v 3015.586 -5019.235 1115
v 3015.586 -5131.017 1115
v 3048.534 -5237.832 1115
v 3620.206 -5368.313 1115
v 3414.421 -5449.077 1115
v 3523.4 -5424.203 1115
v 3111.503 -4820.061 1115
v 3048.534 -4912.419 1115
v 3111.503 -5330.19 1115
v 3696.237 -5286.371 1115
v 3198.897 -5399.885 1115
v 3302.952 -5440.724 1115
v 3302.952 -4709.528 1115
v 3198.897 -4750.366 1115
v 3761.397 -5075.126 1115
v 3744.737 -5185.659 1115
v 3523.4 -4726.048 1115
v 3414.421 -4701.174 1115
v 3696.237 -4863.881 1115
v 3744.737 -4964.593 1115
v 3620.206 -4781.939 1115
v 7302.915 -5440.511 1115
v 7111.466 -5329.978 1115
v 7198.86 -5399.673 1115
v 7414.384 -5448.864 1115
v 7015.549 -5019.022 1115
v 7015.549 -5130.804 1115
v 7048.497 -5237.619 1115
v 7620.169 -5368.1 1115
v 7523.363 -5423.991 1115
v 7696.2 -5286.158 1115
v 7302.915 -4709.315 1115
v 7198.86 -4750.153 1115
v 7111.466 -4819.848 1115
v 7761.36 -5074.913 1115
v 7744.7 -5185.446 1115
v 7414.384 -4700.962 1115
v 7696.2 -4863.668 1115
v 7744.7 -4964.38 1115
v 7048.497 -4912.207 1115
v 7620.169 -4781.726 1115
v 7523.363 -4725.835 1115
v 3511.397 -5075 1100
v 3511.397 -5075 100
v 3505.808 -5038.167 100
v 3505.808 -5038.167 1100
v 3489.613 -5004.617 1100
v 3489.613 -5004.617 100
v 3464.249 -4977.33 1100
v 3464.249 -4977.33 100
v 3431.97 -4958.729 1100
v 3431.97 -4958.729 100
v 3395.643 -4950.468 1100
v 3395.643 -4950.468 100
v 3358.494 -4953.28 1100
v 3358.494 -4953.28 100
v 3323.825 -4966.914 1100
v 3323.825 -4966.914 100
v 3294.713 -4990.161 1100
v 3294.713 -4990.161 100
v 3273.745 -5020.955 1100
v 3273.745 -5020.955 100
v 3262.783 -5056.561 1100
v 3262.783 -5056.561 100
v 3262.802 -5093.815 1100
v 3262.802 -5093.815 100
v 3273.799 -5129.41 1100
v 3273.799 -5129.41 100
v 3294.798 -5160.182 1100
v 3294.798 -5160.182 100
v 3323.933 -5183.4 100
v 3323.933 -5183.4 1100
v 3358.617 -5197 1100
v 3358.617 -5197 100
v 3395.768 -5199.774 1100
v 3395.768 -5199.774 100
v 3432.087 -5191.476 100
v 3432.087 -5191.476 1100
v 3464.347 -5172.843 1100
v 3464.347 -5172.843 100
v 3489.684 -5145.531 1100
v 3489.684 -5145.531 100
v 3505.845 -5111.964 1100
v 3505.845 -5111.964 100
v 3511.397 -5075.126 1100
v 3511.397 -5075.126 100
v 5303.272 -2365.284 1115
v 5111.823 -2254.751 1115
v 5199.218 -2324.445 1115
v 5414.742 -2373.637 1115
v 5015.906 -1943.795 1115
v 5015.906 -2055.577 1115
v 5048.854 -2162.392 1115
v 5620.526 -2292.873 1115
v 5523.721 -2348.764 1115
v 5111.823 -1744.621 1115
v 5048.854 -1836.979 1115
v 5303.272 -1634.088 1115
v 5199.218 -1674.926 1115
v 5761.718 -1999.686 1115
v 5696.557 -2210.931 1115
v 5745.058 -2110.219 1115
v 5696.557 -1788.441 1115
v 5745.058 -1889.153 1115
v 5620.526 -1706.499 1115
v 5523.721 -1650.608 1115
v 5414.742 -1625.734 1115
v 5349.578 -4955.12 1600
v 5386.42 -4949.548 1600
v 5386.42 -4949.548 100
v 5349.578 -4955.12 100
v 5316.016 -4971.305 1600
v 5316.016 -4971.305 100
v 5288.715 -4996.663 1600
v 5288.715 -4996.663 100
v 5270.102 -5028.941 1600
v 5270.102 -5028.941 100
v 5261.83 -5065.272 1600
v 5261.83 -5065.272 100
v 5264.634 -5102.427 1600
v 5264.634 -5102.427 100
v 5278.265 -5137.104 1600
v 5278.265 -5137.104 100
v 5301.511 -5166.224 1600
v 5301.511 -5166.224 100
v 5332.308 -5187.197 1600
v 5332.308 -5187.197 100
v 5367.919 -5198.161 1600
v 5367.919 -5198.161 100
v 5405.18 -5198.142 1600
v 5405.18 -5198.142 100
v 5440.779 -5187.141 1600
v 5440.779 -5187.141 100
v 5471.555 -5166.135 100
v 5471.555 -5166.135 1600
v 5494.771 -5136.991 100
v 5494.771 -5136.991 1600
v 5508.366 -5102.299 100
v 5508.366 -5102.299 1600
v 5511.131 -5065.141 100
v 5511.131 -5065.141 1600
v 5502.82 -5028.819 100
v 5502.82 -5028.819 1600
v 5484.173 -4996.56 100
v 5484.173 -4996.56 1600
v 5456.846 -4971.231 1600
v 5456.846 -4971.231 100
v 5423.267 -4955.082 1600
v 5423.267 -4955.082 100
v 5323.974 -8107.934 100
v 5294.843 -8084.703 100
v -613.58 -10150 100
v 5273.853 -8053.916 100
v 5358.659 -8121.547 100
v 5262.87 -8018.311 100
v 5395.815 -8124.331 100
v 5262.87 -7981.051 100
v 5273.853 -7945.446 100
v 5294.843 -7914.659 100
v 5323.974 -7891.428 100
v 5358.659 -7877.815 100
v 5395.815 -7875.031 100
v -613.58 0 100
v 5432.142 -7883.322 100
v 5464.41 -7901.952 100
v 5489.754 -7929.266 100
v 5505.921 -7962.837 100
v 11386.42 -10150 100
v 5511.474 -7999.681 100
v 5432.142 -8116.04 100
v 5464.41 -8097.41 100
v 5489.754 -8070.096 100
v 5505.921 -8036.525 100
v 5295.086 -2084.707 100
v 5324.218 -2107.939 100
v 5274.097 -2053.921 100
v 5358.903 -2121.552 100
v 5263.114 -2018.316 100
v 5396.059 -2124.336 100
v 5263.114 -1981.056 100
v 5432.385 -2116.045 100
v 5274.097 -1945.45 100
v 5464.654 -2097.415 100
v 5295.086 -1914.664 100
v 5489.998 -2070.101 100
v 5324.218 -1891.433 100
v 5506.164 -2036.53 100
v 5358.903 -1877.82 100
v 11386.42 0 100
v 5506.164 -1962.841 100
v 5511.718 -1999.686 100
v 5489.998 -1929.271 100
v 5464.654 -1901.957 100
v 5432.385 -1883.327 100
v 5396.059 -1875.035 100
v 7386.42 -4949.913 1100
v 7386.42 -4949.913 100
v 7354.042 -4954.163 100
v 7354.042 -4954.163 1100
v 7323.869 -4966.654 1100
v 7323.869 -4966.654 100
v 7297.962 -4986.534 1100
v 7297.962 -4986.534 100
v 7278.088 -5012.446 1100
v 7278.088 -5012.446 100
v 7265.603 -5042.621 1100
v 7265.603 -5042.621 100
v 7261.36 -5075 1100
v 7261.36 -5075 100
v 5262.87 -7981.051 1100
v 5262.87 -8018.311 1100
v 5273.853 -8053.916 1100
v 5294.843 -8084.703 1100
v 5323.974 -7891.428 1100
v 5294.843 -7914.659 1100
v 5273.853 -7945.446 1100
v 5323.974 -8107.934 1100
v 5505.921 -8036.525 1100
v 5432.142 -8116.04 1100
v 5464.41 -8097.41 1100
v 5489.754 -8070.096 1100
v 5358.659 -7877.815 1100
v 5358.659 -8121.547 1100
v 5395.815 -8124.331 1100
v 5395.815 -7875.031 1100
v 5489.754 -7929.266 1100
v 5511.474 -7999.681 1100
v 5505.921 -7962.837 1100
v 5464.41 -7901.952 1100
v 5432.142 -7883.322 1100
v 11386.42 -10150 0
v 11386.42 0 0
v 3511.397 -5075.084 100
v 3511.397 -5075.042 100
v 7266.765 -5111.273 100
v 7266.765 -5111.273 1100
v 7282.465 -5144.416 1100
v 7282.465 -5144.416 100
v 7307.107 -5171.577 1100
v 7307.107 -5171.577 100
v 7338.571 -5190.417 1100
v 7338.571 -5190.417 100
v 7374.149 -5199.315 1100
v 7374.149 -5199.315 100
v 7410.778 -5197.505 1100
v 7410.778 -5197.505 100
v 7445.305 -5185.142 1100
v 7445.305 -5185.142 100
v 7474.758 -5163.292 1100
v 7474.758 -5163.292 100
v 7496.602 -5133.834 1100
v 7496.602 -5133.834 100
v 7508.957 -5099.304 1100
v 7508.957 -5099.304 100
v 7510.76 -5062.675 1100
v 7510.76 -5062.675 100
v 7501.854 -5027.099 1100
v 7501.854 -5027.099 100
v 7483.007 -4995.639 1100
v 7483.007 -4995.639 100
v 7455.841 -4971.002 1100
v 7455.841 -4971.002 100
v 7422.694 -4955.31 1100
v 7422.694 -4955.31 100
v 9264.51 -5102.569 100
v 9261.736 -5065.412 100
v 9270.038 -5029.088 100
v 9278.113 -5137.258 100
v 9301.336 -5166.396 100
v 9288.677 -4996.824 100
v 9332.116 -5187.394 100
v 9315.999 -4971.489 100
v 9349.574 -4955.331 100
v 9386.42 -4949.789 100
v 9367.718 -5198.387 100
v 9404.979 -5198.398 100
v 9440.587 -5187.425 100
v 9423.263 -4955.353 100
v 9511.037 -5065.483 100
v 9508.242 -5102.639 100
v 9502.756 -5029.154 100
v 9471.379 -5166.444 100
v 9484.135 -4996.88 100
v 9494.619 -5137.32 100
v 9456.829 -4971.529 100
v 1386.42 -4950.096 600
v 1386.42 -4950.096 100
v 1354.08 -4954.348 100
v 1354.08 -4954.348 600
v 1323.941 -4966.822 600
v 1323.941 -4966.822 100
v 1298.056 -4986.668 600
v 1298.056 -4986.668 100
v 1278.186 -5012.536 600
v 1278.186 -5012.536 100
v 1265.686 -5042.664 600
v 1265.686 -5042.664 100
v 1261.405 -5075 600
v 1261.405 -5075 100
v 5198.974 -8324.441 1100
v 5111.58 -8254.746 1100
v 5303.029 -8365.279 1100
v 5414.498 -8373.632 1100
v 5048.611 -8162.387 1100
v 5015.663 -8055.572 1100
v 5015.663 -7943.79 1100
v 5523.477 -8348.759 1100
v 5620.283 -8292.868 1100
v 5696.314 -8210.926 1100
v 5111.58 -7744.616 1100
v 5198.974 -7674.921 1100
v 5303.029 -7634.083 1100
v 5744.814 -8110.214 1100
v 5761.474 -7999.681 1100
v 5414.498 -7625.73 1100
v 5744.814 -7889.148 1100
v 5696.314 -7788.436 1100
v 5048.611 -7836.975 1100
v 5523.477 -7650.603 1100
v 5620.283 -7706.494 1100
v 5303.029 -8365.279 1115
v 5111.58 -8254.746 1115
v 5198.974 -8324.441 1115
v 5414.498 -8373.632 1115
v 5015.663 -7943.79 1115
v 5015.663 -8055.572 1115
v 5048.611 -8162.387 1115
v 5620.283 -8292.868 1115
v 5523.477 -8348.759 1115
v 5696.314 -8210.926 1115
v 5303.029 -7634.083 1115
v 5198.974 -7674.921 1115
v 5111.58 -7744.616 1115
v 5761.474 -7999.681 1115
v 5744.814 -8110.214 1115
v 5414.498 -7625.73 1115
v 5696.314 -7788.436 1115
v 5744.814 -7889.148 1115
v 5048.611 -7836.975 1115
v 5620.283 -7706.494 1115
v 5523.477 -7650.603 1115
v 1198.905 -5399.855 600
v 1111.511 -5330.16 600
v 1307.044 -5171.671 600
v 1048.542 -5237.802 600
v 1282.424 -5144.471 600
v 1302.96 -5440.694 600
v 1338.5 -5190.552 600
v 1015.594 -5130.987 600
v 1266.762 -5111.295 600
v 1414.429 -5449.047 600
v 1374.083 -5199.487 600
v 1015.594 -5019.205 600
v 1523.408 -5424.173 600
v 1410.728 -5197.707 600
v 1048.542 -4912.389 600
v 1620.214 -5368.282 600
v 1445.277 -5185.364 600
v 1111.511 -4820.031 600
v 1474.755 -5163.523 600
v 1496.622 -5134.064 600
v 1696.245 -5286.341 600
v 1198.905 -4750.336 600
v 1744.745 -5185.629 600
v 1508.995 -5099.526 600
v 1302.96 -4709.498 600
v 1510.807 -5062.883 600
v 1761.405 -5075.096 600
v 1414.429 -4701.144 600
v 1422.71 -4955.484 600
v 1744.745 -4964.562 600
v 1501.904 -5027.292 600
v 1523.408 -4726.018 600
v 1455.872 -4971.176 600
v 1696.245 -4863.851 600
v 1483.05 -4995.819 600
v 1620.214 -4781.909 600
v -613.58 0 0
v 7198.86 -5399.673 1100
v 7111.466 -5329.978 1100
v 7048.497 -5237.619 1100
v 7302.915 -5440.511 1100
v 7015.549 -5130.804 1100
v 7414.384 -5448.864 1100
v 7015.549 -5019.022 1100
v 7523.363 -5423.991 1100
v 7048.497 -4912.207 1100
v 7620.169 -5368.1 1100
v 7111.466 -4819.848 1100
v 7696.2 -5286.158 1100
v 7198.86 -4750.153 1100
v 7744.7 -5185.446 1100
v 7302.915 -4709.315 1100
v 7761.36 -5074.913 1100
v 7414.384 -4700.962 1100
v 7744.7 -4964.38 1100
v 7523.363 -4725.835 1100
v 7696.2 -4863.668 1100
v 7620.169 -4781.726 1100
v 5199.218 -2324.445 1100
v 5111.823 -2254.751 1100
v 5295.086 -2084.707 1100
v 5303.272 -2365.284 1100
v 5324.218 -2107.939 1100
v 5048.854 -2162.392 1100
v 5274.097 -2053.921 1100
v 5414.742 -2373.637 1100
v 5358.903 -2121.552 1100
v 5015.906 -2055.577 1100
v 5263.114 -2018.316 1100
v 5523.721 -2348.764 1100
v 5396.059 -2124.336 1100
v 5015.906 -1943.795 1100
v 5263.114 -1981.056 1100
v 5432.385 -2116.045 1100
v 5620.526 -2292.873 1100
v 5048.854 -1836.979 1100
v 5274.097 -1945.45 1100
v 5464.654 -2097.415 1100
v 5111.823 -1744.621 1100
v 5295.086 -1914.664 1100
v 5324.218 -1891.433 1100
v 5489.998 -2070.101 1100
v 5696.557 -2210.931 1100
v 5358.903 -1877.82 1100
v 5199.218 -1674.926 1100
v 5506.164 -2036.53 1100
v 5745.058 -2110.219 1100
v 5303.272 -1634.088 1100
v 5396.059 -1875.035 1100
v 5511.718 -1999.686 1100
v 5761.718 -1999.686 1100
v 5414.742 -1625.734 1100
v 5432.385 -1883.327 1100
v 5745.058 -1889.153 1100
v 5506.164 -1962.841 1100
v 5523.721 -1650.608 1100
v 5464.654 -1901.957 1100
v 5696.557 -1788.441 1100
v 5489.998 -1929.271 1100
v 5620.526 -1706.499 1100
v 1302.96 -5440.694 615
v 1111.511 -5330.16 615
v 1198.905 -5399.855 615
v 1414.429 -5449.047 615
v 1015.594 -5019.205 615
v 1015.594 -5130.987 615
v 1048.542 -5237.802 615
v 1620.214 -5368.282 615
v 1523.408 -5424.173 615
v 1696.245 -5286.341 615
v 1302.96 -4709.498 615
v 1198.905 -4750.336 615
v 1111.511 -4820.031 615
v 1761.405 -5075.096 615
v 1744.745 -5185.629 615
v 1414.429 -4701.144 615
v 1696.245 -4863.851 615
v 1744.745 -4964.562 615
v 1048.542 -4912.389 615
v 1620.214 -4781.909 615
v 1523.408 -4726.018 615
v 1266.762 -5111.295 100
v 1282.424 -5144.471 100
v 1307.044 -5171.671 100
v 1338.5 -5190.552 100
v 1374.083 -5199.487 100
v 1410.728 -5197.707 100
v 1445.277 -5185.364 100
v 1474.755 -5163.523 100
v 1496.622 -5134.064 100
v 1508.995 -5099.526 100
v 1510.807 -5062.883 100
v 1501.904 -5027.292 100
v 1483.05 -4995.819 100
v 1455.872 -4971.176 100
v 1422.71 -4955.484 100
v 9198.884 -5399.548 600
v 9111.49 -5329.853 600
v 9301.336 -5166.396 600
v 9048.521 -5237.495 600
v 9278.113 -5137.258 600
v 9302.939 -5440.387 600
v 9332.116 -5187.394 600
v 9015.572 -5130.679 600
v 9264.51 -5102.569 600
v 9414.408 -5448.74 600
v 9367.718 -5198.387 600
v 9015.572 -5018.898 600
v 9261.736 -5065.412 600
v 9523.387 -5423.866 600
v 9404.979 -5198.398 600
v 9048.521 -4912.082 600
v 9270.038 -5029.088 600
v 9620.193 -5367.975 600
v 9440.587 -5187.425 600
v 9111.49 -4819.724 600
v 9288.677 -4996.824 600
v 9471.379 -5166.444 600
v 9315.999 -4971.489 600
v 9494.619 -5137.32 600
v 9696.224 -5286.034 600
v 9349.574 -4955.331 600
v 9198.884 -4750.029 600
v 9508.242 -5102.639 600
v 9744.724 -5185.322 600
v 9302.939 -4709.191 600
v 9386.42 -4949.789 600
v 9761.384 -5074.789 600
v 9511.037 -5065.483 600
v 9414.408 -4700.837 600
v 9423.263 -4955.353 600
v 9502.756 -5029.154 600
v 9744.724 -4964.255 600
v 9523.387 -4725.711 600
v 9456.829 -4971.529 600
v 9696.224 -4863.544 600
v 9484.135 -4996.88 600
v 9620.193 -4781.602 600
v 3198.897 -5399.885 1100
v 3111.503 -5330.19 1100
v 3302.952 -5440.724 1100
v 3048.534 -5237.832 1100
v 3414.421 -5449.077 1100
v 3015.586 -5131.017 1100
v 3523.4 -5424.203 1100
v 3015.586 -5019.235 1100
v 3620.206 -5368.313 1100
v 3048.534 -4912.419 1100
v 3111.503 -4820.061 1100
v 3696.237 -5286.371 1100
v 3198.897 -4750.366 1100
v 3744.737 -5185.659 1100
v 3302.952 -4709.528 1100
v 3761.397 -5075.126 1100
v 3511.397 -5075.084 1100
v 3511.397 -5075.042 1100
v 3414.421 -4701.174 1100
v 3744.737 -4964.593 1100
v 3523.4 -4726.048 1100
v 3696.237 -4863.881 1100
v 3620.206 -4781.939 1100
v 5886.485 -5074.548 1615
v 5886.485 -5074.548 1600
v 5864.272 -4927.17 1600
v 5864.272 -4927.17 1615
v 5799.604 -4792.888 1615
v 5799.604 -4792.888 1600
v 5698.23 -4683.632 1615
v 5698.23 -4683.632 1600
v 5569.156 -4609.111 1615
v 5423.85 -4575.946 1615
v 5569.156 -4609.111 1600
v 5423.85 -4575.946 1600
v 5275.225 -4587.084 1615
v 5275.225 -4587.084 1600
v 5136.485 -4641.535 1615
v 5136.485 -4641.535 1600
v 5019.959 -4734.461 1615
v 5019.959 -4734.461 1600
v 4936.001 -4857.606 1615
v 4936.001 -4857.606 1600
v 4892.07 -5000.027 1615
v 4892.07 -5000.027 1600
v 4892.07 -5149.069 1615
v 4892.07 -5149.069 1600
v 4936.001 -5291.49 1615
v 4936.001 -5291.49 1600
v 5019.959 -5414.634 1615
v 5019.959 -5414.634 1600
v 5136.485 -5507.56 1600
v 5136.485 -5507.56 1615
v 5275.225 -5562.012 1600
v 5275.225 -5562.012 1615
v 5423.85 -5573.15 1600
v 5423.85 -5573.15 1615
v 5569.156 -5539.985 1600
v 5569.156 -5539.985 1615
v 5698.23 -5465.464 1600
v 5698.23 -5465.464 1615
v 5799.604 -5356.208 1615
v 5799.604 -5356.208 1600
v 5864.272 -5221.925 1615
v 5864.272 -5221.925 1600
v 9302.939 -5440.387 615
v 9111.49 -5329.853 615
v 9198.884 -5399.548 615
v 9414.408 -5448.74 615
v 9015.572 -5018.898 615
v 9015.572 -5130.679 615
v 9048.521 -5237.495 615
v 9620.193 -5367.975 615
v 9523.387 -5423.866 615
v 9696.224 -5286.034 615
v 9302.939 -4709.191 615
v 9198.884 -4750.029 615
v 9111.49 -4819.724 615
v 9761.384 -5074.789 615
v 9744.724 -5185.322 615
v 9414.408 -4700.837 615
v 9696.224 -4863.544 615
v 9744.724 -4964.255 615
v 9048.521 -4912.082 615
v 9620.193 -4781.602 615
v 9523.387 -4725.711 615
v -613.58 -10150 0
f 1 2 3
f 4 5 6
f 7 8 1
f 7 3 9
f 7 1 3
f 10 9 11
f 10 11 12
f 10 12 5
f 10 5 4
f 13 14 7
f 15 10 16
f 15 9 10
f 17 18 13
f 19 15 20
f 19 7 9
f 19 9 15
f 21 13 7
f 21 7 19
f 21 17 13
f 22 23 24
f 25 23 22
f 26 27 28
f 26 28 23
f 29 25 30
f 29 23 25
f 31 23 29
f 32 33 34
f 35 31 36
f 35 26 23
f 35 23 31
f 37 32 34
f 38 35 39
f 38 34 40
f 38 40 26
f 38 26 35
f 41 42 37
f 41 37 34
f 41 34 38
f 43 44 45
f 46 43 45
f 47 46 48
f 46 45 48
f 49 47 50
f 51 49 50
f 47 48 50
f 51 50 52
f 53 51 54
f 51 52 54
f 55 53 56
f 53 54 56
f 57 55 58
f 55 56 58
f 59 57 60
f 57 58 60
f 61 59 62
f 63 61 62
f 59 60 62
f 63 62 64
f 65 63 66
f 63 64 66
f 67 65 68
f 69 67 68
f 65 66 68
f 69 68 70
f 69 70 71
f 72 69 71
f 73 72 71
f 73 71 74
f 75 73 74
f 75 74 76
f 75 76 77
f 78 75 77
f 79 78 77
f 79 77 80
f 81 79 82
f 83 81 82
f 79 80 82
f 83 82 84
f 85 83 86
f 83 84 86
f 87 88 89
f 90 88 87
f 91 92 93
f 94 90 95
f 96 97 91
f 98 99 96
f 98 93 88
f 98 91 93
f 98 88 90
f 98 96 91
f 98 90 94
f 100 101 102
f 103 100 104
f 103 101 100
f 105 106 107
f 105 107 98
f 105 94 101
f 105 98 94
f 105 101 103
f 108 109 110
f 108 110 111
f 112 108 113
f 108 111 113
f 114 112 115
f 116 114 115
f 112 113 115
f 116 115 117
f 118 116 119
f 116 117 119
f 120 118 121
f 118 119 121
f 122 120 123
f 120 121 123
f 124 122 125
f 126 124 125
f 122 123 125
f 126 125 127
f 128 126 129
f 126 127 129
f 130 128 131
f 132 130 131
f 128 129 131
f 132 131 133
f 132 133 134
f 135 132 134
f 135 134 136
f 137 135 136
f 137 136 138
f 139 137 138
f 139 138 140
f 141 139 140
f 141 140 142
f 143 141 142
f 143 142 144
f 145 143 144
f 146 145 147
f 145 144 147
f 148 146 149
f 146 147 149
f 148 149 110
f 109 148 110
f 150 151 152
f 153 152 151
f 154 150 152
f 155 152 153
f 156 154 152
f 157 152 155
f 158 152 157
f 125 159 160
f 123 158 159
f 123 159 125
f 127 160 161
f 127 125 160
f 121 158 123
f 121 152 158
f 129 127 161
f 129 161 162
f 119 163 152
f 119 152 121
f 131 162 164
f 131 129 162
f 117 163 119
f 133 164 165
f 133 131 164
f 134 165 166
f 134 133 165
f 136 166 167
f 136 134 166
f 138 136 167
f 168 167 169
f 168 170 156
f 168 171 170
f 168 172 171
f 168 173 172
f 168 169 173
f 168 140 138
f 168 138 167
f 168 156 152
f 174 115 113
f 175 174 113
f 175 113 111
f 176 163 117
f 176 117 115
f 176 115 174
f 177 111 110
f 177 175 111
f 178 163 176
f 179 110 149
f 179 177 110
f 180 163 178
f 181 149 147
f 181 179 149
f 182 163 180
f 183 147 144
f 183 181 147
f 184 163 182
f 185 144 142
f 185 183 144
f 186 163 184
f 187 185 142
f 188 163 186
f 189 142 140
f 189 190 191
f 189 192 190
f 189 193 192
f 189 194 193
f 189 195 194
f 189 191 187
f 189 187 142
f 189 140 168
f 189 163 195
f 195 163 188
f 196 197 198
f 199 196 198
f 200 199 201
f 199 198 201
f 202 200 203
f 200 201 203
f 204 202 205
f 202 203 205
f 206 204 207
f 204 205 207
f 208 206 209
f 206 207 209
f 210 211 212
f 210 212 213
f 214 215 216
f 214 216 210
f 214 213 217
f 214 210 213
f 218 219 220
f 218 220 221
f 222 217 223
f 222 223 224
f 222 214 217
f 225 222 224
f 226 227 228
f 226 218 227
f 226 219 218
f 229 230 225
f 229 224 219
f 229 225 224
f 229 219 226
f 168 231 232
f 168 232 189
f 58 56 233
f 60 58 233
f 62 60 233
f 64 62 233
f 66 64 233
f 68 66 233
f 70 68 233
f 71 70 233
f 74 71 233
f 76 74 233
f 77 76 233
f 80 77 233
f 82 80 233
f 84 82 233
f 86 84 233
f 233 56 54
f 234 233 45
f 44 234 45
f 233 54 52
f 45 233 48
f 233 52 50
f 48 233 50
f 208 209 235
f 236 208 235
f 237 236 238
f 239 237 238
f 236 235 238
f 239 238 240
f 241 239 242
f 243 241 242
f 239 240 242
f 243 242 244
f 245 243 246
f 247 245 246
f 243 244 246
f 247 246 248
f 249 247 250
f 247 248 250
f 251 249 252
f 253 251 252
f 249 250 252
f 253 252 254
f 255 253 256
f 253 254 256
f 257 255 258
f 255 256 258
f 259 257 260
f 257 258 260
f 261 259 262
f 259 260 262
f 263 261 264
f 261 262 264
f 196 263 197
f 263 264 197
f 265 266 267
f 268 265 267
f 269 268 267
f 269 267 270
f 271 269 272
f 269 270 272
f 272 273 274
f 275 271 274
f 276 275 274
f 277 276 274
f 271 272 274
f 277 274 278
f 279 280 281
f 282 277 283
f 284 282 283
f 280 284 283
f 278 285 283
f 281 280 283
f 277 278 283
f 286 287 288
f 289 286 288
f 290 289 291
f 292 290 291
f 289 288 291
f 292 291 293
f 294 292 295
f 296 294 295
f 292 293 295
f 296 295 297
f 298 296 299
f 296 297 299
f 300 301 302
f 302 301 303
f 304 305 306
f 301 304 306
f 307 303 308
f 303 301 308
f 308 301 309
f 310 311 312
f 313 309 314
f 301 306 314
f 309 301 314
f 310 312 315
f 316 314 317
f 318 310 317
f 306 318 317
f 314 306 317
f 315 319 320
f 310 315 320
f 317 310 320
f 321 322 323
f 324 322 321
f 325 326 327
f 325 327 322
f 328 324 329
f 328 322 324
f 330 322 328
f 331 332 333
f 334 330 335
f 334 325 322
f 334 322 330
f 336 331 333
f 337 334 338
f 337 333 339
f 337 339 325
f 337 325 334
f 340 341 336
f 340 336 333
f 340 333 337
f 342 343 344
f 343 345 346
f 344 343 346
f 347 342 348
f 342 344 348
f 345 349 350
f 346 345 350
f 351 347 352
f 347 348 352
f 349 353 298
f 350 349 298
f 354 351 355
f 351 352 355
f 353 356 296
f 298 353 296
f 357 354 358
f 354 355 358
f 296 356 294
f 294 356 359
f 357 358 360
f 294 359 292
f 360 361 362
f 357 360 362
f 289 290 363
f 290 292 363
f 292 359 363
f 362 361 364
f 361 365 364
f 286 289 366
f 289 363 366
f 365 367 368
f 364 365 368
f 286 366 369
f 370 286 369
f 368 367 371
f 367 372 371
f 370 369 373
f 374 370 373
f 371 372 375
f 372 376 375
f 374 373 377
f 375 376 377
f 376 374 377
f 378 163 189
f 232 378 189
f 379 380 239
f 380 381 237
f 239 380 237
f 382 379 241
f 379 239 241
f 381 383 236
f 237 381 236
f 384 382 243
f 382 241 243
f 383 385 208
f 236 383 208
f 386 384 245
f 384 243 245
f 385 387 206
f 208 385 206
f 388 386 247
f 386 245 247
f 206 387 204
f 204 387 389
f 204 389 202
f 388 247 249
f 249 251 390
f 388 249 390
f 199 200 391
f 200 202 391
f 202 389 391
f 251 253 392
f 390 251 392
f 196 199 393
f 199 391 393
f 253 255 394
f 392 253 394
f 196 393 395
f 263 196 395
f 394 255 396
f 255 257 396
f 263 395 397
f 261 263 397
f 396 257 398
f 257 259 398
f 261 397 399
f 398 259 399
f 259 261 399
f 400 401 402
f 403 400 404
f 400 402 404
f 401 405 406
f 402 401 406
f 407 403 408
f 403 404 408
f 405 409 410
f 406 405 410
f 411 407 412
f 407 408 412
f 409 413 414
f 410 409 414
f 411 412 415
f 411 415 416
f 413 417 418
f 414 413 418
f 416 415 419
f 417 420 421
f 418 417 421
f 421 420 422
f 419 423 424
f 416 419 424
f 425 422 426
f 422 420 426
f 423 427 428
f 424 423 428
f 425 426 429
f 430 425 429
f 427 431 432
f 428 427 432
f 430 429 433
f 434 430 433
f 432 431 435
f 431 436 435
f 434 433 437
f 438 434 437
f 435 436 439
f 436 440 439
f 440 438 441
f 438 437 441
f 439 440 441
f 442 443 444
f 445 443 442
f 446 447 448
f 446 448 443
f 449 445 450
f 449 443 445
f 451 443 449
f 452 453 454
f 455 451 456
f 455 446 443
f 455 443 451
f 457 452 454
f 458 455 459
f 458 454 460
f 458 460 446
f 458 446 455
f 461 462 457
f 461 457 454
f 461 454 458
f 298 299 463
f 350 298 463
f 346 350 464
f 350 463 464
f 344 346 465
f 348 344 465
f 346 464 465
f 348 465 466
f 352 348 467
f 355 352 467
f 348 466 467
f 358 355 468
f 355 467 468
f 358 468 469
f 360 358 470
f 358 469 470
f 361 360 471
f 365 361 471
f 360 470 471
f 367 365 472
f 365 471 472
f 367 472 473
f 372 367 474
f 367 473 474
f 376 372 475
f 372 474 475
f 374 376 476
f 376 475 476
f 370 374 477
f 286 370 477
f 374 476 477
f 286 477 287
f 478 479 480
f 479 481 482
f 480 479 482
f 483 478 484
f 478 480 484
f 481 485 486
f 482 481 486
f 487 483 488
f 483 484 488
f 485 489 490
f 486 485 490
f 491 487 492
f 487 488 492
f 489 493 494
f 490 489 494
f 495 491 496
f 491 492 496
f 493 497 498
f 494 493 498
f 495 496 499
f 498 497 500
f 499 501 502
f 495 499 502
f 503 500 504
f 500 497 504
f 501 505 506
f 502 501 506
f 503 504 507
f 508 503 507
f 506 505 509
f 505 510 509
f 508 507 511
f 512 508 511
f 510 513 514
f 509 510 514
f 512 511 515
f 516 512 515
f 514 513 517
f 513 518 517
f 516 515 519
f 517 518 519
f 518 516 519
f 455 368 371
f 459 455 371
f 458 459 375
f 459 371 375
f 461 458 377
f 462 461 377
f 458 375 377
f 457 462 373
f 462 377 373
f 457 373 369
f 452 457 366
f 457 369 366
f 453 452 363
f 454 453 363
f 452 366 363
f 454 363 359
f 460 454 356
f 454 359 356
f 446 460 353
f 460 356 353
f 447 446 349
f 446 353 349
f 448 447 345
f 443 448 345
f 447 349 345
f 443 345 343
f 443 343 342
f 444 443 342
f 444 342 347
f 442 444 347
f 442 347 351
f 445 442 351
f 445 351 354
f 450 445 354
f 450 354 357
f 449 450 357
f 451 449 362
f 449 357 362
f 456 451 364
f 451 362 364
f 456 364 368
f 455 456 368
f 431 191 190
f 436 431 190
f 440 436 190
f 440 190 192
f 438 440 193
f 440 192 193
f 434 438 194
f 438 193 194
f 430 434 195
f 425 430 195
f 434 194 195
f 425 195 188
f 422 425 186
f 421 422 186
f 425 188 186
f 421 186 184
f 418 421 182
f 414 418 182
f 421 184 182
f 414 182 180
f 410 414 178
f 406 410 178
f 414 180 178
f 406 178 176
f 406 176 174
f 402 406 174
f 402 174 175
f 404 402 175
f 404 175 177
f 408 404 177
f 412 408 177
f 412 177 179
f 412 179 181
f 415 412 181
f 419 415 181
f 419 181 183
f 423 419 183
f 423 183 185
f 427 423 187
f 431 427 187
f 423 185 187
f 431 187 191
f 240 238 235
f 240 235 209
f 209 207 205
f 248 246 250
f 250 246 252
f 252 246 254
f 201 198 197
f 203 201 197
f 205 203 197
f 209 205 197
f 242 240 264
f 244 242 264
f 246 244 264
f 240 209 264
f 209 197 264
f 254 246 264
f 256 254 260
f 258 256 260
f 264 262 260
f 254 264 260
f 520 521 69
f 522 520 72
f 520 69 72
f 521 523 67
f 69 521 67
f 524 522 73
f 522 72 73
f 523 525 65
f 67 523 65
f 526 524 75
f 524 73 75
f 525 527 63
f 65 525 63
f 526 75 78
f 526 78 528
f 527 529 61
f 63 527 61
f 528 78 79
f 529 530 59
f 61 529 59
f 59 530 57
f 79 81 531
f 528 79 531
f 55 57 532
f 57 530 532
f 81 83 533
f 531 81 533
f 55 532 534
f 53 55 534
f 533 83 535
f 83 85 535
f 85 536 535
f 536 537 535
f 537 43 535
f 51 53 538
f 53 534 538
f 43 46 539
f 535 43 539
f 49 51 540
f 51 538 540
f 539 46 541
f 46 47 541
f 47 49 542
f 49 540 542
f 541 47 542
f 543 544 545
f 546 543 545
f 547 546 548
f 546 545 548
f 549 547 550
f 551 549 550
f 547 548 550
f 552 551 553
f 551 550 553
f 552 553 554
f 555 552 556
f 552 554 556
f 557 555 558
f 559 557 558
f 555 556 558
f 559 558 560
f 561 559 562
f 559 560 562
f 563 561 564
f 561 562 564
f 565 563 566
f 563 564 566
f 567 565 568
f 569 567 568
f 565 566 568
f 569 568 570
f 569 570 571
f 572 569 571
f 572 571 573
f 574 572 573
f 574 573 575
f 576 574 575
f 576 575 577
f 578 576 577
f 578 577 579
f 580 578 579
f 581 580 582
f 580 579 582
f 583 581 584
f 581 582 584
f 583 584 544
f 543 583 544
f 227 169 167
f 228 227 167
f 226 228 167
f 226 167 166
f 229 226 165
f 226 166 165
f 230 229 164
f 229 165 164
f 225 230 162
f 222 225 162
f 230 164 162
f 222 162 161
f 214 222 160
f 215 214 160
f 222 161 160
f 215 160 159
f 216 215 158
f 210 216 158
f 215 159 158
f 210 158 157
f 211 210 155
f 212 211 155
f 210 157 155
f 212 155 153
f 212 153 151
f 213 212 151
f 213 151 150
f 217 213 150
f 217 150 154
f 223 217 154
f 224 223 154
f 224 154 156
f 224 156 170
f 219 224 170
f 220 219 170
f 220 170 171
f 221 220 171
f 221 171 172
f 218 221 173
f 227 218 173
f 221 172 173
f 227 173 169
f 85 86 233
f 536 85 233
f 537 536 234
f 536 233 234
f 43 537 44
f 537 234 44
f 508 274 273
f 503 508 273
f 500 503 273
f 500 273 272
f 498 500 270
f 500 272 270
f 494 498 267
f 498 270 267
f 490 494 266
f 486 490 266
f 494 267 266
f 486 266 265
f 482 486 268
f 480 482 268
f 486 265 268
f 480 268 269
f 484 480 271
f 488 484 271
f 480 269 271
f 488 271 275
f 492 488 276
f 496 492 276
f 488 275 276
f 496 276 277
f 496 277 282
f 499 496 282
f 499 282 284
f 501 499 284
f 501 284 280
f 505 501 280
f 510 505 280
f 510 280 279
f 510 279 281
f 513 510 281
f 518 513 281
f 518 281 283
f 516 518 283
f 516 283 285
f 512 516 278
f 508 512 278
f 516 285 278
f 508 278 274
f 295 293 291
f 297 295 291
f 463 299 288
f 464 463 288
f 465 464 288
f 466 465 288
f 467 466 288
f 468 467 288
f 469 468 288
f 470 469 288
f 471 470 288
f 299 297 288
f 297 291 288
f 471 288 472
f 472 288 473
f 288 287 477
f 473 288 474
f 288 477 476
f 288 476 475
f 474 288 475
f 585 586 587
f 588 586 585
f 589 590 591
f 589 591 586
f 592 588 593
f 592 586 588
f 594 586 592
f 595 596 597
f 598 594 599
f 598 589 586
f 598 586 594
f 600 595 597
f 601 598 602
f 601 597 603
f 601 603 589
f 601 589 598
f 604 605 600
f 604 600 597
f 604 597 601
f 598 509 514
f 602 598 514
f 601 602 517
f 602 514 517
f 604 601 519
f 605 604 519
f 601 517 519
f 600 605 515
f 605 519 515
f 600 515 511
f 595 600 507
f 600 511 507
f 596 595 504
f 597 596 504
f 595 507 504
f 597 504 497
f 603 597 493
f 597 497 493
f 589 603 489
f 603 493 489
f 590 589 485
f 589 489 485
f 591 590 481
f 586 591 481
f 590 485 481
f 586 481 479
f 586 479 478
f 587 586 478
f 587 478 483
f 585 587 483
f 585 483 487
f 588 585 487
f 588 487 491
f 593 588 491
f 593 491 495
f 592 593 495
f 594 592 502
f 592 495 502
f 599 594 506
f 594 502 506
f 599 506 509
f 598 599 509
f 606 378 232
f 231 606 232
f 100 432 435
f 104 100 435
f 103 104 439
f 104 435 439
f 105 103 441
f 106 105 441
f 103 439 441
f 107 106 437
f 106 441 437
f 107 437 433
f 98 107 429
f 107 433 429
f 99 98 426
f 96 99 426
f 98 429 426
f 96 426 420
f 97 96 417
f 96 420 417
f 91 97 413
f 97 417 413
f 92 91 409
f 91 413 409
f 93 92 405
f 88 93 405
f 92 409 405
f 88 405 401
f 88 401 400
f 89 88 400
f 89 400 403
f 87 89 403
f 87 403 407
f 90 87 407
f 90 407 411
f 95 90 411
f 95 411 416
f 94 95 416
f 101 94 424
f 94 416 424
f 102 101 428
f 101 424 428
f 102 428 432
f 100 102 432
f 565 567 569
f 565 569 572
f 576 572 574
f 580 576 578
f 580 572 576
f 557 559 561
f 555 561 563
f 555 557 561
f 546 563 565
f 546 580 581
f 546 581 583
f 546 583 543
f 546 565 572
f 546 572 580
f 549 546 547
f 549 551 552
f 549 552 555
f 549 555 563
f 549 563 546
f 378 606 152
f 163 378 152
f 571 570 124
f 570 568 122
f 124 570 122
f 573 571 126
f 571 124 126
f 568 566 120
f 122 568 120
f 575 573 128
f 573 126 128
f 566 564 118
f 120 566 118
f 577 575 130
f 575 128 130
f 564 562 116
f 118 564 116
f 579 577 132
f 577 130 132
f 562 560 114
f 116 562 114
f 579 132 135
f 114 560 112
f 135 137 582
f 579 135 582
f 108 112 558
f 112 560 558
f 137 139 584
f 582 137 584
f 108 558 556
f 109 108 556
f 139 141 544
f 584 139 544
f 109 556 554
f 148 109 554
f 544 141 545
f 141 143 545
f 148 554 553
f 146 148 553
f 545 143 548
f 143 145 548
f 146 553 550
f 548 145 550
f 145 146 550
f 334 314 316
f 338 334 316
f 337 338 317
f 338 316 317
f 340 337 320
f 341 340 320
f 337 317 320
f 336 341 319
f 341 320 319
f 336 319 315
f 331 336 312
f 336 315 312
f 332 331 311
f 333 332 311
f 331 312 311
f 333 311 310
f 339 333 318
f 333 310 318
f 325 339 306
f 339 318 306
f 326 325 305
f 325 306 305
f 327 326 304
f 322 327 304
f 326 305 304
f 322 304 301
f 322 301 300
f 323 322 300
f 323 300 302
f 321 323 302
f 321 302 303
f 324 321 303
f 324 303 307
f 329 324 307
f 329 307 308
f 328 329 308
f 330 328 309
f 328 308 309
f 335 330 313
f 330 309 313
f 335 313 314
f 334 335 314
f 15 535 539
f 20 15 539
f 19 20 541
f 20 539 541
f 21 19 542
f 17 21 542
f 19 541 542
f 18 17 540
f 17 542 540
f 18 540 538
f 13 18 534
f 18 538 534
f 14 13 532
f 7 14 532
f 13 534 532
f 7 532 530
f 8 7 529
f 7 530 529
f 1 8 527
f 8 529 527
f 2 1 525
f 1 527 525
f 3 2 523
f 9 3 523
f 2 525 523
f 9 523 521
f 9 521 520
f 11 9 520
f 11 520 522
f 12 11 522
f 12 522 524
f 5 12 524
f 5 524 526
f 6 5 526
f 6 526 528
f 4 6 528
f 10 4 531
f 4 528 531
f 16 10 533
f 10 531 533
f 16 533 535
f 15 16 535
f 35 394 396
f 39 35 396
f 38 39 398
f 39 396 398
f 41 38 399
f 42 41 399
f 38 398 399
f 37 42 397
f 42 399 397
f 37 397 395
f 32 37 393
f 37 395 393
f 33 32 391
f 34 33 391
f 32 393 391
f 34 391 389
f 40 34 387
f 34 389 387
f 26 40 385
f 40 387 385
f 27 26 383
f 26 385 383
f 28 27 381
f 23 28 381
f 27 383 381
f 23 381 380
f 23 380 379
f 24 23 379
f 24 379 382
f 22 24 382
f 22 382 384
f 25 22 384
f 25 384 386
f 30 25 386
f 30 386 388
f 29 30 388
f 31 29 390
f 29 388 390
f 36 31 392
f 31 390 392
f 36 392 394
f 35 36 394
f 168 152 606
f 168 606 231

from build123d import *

# Parameters (mm, degrees)
F0_W      = 12000
F0_H      = 100
F1_DEPTH  = 10150
F10_DEPTH = 1500
F11_DEPTH = 500
F12_DEPTH = 1000
F16_DEPTH = 1000
F17_R     = 375
F17_R_2   = 125
F18_DEPTH = 15
F19_R     = 500
F19_R_2   = 125
F20_DEPTH = 15
F21_R     = 375
F21_R_2   = 125
F22_DEPTH = 15
F23_R     = 375
F23_R_2   = 125
F24_DEPTH = 15
F25_R     = 375
F26_DEPTH = 15
F27_R     = 375
F27_R_2   = 125
F28_DEPTH = 15
F29_R     = 375
F29_R_2   = 125
F30_DEPTH = 15


with BuildPart() as f1:
    # F0 (on Front) → F1 (new body)
    with BuildSketch(Plane.XZ):
        with Locations((5386.4197711137, 50)):
            Rectangle(F0_W, F0_H)
    extrude(amount=F1_DEPTH)

    # F3 (on face) → F10 (join)
    with BuildSketch(Plane.XY.offset(100)):
        with BuildLine():
            ThreePointArc((5261.4859178516, -5075), (5386.7112163429, -5199.5475631242), (5511.4850997925, -5074.5477676392))
            ThreePointArc((5511.4850997925, -5074.5477676392), (5474.8503472463, -4986.136325832), (5386.4197711137, -4949.5477847105))
            Line((5386.4197711137, -4949.5477847105), (5386.4197711137, -5075))
            Line((5386.4197711137, -5075), (5261.4859178516, -5075))
        make_face()
        with BuildLine():
            Line((5386.4197711137, -5075), (5386.4197711137, -4949.5477847105))
            ThreePointArc((5386.4197711137, -4949.5477847105), (5297.9139558776, -4986.3425950833), (5261.4859178516, -5075))
            Line((5261.4859178516, -5075), (5386.4197711137, -5075))
        make_face()
    extrude(amount=F10_DEPTH)

    # F14 (on face) + F15 (on face) → F16 (join)
    with BuildSketch(Plane.XY.offset(100)):
        with BuildLine():
            Line((5386.4197711137, -2124.6855282454), (5386.4197711137, -1874.6862387986))
            ThreePointArc((5386.4197711137, -1874.6862387986), (5261.7177963257, -1999.685883522), (5386.4197711137, -2124.6855282454))
        make_face()
        with BuildLine():
            ThreePointArc((5386.4197711137, -2124.6855282454), (5475.0007132703, -2088.1795362647), (5511.7177963257, -1999.685883522))
            ThreePointArc((5511.7177963257, -1999.685883522), (5475.0007132703, -1911.1922307793), (5386.4197711137, -1874.6862387986))
            Line((5386.4197711137, -1874.6862387986), (5386.4197711137, -2124.6855282454))
        make_face()
    with BuildSketch(Plane.XY.offset(100)):
        with BuildLine():
            Line((5386.4197711137, -8124.6809841205), (5386.4197711137, -7874.6810077618))
            ThreePointArc((5386.4197711137, -7874.6810077618), (5261.4741325378, -7999.6809959412), (5386.4197711137, -8124.6809841205))
        make_face()
        with BuildLine():
            ThreePointArc((5386.4197711137, -8124.6809841205), (5474.8432584303, -8088.0885611661), (5511.4741325378, -7999.6809959412))
            ThreePointArc((5511.4741325378, -7999.6809959412), (5474.8432584303, -7911.2734307162), (5386.4197711137, -7874.6810077618))
            Line((5386.4197711137, -7874.6810077618), (5386.4197711137, -8124.6809841205))
        make_face()
    extrude(amount=F16_DEPTH)

    # F17 (on face) → F18 (join)
    with BuildSketch(Plane.XY.offset(1100)):
        with Locations((5386.7177963257, -1999.685883522)):
            Circle(F17_R)
        with Locations((5386.7177963257, -1999.685883522)):
            Circle(F17_R_2, mode=Mode.SUBTRACT)
        with Locations((5386.7177963257, -1999.685883522)):
            Circle(F17_R_2)
    extrude(amount=F18_DEPTH)

    # F19 (on face) → F20 (join)
    with BuildSketch(Plane.XY.offset(1600)):
        with Locations((5386.4850997925, -5074.5477676392)):
            Circle(F19_R)
        with Locations((5386.4850997925, -5074.5477676392)):
            Circle(F19_R_2, mode=Mode.SUBTRACT)
        with Locations((5386.4850997925, -5074.5477676392)):
            Circle(F19_R_2)
    extrude(amount=F20_DEPTH)


with BuildPart() as f11:
    # F9 (on face) → F11 (new body)
    with BuildSketch(Plane.XY.offset(100)):
        with BuildLine():
            ThreePointArc((1261.4053853762, -5075), (1386.3575220073, -5200.0956443843), (1511.4053487778, -5075.0956535339))
            ThreePointArc((1511.4053487778, -5075.0956535339), (1474.7987953448, -4986.7124050985), (1386.4197711137, -4950.095654366))
            Line((1386.4197711137, -4950.095654366), (1386.4197711137, -5075))
            Line((1386.4197711137, -5075), (1261.4053853762, -5075))
        make_face()
        with BuildLine():
            Line((1386.4197711137, -5075), (1386.4197711137, -4950.095654366))
            ThreePointArc((1386.4197711137, -4950.095654366), (1298.0559273963, -4986.6683967543), (1261.4053853762, -5075))
            Line((1261.4053853762, -5075), (1386.4197711137, -5075))
        make_face()
    extrude(amount=F11_DEPTH)

    # F23 (on face) → F24 (join)
    with BuildSketch(Plane.XY.offset(600)):
        with Locations((1386.4053487778, -5075.0956535339)):
            Circle(F23_R)
        with Locations((1386.4053487778, -5075.0956535339)):
            Circle(F23_R_2, mode=Mode.SUBTRACT)
        with Locations((1386.4053487778, -5075.0956535339)):
            Circle(F23_R_2)
    extrude(amount=F24_DEPTH)


with BuildPart() as f11b:
    # F7 (on face) → F11, piece 2 (new body)
    with BuildSketch(Plane.XY.offset(100)):
        with BuildLine():
            ThreePointArc((9261.384189125, -5075), (9386.4897251507, -5199.7885257015), (9511.3840103149, -5074.7885704041))
            ThreePointArc((9511.3840103149, -5074.7885704041), (9474.7850004108, -4986.4128670118), (9386.4197711137, -4949.7885755194))
            Line((9386.4197711137, -4949.7885755194), (9386.4197711137, -5075))
            Line((9386.4197711137, -5075), (9261.384189125, -5075))
        make_face()
        with BuildLine():
            Line((9386.4197711137, -5075), (9386.4197711137, -4949.7885755194))
            ThreePointArc((9386.4197711137, -4949.7885755194), (9297.9335761584, -4986.462352906), (9261.384189125, -5075))
            Line((9261.384189125, -5075), (9386.4197711137, -5075))
        make_face()
    extrude(amount=F11_DEPTH)

    # F29 (on face) → F30 (join)
    with BuildSketch(Plane.XY.offset(600)):
        with Locations((9386.3840103149, -5074.7885704041)):
            Circle(F29_R)
        with Locations((9386.3840103149, -5074.7885704041)):
            Circle(F29_R_2, mode=Mode.SUBTRACT)
        with Locations((9386.3840103149, -5074.7885704041)):
            Circle(F29_R_2)
    extrude(amount=F30_DEPTH)


with BuildPart() as f12:
    # F8 (on face) → F12 (new body)
    with BuildSketch(Plane.XY.offset(100)):
        with BuildLine():
            Line((3261.397186533, -5075), (3511.3970601406, -5075))
            ThreePointArc((3511.3970601406, -5075), (3386.3971233368, -4950.1256942749), (3261.397186533, -5075))
        make_face()
        with BuildLine():
            ThreePointArc((3261.397186533, -5075), (3386.3342761914, -5200.1256784758), (3511.3971233368, -5075.1256942749))
            ThreePointArc((3511.3971233368, -5075.1256942749), (3511.3971075377, -5075.0628471295), (3511.3970601406, -5075))
            Line((3511.3970601406, -5075), (3261.397186533, -5075))
        make_face()
    extrude(amount=F12_DEPTH)

    # F25 (on face) → F26 (join)
    with BuildSketch(Plane.XY.offset(1100)):
        with Locations((3386.3971233368, -5075.1256942749)):
            Circle(F25_R)
        with BuildLine():
            ThreePointArc((3511.3971233368, -5075.1256942749), (3261.3971391358, -5075.1885414211), (3511.3970601406, -5075))
            ThreePointArc((3511.3970601406, -5075), (3511.3971075377, -5075.0628471295), (3511.3971233368, -5075.1256942749))
        make_face(mode=Mode.SUBTRACT)
        with BuildLine():
            ThreePointArc((3511.3971233368, -5075.1256942749), (3511.3971075377, -5075.0628471295), (3511.3970601406, -5075))
            ThreePointArc((3511.3970601406, -5075), (3261.3971391358, -5075.1885414211), (3511.3971233368, -5075.1256942749))
        make_face()
    extrude(amount=F26_DEPTH)


with BuildPart() as f12b:
    # F6 (on face) → F12, piece 2 (new body)
    with BuildSketch(Plane.XY.offset(100)):
        with BuildLine():
            ThreePointArc((7261.3601987157, -5075), (7386.4036560085, -5199.9130173377), (7511.360168457, -5074.9130249023))
            ThreePointArc((7511.360168457, -5074.9130249023), (7474.7695863153, -4986.545752488), (7386.4197711137, -4949.9130391123))
            Line((7386.4197711137, -4949.9130391123), (7386.4197711137, -5075))
            Line((7386.4197711137, -5075), (7261.3601987157, -5075))
        make_face()
        with BuildLine():
            Line((7386.4197711137, -5075), (7386.4197711137, -4949.9130391123))
            ThreePointArc((7386.4197711137, -4949.9130391123), (7297.9621437175, -4986.5343554048), (7261.3601987157, -5075))
            Line((7261.3601987157, -5075), (7386.4197711137, -5075))
        make_face()
    extrude(amount=F12_DEPTH)

    # F27 (on face) → F28 (join)
    with BuildSketch(Plane.XY.offset(1100)):
        with Locations((7386.360168457, -5074.9130249023)):
            Circle(F27_R)
        with Locations((7386.360168457, -5074.9130249023)):
            Circle(F27_R_2, mode=Mode.SUBTRACT)
        with Locations((7386.360168457, -5074.9130249023)):
            Circle(F27_R_2)
    extrude(amount=F28_DEPTH)


with BuildPart() as f22:
    # F21 (on face) → F22 (new body)
    with BuildSketch(Plane.XY.offset(1100)):
        with Locations((5386.4741325378, -7999.6809959412)):
            Circle(F21_R)
        with Locations((5386.4741325378, -7999.6809959412)):
            Circle(F21_R_2, mode=Mode.SUBTRACT)
        with Locations((5386.4741325378, -7999.6809959412)):
            Circle(F21_R_2)
    extrude(amount=F22_DEPTH)


solid = Compound([f1.part, f11.part, f11b.part, f12.part, f12b.part, f22.part])
